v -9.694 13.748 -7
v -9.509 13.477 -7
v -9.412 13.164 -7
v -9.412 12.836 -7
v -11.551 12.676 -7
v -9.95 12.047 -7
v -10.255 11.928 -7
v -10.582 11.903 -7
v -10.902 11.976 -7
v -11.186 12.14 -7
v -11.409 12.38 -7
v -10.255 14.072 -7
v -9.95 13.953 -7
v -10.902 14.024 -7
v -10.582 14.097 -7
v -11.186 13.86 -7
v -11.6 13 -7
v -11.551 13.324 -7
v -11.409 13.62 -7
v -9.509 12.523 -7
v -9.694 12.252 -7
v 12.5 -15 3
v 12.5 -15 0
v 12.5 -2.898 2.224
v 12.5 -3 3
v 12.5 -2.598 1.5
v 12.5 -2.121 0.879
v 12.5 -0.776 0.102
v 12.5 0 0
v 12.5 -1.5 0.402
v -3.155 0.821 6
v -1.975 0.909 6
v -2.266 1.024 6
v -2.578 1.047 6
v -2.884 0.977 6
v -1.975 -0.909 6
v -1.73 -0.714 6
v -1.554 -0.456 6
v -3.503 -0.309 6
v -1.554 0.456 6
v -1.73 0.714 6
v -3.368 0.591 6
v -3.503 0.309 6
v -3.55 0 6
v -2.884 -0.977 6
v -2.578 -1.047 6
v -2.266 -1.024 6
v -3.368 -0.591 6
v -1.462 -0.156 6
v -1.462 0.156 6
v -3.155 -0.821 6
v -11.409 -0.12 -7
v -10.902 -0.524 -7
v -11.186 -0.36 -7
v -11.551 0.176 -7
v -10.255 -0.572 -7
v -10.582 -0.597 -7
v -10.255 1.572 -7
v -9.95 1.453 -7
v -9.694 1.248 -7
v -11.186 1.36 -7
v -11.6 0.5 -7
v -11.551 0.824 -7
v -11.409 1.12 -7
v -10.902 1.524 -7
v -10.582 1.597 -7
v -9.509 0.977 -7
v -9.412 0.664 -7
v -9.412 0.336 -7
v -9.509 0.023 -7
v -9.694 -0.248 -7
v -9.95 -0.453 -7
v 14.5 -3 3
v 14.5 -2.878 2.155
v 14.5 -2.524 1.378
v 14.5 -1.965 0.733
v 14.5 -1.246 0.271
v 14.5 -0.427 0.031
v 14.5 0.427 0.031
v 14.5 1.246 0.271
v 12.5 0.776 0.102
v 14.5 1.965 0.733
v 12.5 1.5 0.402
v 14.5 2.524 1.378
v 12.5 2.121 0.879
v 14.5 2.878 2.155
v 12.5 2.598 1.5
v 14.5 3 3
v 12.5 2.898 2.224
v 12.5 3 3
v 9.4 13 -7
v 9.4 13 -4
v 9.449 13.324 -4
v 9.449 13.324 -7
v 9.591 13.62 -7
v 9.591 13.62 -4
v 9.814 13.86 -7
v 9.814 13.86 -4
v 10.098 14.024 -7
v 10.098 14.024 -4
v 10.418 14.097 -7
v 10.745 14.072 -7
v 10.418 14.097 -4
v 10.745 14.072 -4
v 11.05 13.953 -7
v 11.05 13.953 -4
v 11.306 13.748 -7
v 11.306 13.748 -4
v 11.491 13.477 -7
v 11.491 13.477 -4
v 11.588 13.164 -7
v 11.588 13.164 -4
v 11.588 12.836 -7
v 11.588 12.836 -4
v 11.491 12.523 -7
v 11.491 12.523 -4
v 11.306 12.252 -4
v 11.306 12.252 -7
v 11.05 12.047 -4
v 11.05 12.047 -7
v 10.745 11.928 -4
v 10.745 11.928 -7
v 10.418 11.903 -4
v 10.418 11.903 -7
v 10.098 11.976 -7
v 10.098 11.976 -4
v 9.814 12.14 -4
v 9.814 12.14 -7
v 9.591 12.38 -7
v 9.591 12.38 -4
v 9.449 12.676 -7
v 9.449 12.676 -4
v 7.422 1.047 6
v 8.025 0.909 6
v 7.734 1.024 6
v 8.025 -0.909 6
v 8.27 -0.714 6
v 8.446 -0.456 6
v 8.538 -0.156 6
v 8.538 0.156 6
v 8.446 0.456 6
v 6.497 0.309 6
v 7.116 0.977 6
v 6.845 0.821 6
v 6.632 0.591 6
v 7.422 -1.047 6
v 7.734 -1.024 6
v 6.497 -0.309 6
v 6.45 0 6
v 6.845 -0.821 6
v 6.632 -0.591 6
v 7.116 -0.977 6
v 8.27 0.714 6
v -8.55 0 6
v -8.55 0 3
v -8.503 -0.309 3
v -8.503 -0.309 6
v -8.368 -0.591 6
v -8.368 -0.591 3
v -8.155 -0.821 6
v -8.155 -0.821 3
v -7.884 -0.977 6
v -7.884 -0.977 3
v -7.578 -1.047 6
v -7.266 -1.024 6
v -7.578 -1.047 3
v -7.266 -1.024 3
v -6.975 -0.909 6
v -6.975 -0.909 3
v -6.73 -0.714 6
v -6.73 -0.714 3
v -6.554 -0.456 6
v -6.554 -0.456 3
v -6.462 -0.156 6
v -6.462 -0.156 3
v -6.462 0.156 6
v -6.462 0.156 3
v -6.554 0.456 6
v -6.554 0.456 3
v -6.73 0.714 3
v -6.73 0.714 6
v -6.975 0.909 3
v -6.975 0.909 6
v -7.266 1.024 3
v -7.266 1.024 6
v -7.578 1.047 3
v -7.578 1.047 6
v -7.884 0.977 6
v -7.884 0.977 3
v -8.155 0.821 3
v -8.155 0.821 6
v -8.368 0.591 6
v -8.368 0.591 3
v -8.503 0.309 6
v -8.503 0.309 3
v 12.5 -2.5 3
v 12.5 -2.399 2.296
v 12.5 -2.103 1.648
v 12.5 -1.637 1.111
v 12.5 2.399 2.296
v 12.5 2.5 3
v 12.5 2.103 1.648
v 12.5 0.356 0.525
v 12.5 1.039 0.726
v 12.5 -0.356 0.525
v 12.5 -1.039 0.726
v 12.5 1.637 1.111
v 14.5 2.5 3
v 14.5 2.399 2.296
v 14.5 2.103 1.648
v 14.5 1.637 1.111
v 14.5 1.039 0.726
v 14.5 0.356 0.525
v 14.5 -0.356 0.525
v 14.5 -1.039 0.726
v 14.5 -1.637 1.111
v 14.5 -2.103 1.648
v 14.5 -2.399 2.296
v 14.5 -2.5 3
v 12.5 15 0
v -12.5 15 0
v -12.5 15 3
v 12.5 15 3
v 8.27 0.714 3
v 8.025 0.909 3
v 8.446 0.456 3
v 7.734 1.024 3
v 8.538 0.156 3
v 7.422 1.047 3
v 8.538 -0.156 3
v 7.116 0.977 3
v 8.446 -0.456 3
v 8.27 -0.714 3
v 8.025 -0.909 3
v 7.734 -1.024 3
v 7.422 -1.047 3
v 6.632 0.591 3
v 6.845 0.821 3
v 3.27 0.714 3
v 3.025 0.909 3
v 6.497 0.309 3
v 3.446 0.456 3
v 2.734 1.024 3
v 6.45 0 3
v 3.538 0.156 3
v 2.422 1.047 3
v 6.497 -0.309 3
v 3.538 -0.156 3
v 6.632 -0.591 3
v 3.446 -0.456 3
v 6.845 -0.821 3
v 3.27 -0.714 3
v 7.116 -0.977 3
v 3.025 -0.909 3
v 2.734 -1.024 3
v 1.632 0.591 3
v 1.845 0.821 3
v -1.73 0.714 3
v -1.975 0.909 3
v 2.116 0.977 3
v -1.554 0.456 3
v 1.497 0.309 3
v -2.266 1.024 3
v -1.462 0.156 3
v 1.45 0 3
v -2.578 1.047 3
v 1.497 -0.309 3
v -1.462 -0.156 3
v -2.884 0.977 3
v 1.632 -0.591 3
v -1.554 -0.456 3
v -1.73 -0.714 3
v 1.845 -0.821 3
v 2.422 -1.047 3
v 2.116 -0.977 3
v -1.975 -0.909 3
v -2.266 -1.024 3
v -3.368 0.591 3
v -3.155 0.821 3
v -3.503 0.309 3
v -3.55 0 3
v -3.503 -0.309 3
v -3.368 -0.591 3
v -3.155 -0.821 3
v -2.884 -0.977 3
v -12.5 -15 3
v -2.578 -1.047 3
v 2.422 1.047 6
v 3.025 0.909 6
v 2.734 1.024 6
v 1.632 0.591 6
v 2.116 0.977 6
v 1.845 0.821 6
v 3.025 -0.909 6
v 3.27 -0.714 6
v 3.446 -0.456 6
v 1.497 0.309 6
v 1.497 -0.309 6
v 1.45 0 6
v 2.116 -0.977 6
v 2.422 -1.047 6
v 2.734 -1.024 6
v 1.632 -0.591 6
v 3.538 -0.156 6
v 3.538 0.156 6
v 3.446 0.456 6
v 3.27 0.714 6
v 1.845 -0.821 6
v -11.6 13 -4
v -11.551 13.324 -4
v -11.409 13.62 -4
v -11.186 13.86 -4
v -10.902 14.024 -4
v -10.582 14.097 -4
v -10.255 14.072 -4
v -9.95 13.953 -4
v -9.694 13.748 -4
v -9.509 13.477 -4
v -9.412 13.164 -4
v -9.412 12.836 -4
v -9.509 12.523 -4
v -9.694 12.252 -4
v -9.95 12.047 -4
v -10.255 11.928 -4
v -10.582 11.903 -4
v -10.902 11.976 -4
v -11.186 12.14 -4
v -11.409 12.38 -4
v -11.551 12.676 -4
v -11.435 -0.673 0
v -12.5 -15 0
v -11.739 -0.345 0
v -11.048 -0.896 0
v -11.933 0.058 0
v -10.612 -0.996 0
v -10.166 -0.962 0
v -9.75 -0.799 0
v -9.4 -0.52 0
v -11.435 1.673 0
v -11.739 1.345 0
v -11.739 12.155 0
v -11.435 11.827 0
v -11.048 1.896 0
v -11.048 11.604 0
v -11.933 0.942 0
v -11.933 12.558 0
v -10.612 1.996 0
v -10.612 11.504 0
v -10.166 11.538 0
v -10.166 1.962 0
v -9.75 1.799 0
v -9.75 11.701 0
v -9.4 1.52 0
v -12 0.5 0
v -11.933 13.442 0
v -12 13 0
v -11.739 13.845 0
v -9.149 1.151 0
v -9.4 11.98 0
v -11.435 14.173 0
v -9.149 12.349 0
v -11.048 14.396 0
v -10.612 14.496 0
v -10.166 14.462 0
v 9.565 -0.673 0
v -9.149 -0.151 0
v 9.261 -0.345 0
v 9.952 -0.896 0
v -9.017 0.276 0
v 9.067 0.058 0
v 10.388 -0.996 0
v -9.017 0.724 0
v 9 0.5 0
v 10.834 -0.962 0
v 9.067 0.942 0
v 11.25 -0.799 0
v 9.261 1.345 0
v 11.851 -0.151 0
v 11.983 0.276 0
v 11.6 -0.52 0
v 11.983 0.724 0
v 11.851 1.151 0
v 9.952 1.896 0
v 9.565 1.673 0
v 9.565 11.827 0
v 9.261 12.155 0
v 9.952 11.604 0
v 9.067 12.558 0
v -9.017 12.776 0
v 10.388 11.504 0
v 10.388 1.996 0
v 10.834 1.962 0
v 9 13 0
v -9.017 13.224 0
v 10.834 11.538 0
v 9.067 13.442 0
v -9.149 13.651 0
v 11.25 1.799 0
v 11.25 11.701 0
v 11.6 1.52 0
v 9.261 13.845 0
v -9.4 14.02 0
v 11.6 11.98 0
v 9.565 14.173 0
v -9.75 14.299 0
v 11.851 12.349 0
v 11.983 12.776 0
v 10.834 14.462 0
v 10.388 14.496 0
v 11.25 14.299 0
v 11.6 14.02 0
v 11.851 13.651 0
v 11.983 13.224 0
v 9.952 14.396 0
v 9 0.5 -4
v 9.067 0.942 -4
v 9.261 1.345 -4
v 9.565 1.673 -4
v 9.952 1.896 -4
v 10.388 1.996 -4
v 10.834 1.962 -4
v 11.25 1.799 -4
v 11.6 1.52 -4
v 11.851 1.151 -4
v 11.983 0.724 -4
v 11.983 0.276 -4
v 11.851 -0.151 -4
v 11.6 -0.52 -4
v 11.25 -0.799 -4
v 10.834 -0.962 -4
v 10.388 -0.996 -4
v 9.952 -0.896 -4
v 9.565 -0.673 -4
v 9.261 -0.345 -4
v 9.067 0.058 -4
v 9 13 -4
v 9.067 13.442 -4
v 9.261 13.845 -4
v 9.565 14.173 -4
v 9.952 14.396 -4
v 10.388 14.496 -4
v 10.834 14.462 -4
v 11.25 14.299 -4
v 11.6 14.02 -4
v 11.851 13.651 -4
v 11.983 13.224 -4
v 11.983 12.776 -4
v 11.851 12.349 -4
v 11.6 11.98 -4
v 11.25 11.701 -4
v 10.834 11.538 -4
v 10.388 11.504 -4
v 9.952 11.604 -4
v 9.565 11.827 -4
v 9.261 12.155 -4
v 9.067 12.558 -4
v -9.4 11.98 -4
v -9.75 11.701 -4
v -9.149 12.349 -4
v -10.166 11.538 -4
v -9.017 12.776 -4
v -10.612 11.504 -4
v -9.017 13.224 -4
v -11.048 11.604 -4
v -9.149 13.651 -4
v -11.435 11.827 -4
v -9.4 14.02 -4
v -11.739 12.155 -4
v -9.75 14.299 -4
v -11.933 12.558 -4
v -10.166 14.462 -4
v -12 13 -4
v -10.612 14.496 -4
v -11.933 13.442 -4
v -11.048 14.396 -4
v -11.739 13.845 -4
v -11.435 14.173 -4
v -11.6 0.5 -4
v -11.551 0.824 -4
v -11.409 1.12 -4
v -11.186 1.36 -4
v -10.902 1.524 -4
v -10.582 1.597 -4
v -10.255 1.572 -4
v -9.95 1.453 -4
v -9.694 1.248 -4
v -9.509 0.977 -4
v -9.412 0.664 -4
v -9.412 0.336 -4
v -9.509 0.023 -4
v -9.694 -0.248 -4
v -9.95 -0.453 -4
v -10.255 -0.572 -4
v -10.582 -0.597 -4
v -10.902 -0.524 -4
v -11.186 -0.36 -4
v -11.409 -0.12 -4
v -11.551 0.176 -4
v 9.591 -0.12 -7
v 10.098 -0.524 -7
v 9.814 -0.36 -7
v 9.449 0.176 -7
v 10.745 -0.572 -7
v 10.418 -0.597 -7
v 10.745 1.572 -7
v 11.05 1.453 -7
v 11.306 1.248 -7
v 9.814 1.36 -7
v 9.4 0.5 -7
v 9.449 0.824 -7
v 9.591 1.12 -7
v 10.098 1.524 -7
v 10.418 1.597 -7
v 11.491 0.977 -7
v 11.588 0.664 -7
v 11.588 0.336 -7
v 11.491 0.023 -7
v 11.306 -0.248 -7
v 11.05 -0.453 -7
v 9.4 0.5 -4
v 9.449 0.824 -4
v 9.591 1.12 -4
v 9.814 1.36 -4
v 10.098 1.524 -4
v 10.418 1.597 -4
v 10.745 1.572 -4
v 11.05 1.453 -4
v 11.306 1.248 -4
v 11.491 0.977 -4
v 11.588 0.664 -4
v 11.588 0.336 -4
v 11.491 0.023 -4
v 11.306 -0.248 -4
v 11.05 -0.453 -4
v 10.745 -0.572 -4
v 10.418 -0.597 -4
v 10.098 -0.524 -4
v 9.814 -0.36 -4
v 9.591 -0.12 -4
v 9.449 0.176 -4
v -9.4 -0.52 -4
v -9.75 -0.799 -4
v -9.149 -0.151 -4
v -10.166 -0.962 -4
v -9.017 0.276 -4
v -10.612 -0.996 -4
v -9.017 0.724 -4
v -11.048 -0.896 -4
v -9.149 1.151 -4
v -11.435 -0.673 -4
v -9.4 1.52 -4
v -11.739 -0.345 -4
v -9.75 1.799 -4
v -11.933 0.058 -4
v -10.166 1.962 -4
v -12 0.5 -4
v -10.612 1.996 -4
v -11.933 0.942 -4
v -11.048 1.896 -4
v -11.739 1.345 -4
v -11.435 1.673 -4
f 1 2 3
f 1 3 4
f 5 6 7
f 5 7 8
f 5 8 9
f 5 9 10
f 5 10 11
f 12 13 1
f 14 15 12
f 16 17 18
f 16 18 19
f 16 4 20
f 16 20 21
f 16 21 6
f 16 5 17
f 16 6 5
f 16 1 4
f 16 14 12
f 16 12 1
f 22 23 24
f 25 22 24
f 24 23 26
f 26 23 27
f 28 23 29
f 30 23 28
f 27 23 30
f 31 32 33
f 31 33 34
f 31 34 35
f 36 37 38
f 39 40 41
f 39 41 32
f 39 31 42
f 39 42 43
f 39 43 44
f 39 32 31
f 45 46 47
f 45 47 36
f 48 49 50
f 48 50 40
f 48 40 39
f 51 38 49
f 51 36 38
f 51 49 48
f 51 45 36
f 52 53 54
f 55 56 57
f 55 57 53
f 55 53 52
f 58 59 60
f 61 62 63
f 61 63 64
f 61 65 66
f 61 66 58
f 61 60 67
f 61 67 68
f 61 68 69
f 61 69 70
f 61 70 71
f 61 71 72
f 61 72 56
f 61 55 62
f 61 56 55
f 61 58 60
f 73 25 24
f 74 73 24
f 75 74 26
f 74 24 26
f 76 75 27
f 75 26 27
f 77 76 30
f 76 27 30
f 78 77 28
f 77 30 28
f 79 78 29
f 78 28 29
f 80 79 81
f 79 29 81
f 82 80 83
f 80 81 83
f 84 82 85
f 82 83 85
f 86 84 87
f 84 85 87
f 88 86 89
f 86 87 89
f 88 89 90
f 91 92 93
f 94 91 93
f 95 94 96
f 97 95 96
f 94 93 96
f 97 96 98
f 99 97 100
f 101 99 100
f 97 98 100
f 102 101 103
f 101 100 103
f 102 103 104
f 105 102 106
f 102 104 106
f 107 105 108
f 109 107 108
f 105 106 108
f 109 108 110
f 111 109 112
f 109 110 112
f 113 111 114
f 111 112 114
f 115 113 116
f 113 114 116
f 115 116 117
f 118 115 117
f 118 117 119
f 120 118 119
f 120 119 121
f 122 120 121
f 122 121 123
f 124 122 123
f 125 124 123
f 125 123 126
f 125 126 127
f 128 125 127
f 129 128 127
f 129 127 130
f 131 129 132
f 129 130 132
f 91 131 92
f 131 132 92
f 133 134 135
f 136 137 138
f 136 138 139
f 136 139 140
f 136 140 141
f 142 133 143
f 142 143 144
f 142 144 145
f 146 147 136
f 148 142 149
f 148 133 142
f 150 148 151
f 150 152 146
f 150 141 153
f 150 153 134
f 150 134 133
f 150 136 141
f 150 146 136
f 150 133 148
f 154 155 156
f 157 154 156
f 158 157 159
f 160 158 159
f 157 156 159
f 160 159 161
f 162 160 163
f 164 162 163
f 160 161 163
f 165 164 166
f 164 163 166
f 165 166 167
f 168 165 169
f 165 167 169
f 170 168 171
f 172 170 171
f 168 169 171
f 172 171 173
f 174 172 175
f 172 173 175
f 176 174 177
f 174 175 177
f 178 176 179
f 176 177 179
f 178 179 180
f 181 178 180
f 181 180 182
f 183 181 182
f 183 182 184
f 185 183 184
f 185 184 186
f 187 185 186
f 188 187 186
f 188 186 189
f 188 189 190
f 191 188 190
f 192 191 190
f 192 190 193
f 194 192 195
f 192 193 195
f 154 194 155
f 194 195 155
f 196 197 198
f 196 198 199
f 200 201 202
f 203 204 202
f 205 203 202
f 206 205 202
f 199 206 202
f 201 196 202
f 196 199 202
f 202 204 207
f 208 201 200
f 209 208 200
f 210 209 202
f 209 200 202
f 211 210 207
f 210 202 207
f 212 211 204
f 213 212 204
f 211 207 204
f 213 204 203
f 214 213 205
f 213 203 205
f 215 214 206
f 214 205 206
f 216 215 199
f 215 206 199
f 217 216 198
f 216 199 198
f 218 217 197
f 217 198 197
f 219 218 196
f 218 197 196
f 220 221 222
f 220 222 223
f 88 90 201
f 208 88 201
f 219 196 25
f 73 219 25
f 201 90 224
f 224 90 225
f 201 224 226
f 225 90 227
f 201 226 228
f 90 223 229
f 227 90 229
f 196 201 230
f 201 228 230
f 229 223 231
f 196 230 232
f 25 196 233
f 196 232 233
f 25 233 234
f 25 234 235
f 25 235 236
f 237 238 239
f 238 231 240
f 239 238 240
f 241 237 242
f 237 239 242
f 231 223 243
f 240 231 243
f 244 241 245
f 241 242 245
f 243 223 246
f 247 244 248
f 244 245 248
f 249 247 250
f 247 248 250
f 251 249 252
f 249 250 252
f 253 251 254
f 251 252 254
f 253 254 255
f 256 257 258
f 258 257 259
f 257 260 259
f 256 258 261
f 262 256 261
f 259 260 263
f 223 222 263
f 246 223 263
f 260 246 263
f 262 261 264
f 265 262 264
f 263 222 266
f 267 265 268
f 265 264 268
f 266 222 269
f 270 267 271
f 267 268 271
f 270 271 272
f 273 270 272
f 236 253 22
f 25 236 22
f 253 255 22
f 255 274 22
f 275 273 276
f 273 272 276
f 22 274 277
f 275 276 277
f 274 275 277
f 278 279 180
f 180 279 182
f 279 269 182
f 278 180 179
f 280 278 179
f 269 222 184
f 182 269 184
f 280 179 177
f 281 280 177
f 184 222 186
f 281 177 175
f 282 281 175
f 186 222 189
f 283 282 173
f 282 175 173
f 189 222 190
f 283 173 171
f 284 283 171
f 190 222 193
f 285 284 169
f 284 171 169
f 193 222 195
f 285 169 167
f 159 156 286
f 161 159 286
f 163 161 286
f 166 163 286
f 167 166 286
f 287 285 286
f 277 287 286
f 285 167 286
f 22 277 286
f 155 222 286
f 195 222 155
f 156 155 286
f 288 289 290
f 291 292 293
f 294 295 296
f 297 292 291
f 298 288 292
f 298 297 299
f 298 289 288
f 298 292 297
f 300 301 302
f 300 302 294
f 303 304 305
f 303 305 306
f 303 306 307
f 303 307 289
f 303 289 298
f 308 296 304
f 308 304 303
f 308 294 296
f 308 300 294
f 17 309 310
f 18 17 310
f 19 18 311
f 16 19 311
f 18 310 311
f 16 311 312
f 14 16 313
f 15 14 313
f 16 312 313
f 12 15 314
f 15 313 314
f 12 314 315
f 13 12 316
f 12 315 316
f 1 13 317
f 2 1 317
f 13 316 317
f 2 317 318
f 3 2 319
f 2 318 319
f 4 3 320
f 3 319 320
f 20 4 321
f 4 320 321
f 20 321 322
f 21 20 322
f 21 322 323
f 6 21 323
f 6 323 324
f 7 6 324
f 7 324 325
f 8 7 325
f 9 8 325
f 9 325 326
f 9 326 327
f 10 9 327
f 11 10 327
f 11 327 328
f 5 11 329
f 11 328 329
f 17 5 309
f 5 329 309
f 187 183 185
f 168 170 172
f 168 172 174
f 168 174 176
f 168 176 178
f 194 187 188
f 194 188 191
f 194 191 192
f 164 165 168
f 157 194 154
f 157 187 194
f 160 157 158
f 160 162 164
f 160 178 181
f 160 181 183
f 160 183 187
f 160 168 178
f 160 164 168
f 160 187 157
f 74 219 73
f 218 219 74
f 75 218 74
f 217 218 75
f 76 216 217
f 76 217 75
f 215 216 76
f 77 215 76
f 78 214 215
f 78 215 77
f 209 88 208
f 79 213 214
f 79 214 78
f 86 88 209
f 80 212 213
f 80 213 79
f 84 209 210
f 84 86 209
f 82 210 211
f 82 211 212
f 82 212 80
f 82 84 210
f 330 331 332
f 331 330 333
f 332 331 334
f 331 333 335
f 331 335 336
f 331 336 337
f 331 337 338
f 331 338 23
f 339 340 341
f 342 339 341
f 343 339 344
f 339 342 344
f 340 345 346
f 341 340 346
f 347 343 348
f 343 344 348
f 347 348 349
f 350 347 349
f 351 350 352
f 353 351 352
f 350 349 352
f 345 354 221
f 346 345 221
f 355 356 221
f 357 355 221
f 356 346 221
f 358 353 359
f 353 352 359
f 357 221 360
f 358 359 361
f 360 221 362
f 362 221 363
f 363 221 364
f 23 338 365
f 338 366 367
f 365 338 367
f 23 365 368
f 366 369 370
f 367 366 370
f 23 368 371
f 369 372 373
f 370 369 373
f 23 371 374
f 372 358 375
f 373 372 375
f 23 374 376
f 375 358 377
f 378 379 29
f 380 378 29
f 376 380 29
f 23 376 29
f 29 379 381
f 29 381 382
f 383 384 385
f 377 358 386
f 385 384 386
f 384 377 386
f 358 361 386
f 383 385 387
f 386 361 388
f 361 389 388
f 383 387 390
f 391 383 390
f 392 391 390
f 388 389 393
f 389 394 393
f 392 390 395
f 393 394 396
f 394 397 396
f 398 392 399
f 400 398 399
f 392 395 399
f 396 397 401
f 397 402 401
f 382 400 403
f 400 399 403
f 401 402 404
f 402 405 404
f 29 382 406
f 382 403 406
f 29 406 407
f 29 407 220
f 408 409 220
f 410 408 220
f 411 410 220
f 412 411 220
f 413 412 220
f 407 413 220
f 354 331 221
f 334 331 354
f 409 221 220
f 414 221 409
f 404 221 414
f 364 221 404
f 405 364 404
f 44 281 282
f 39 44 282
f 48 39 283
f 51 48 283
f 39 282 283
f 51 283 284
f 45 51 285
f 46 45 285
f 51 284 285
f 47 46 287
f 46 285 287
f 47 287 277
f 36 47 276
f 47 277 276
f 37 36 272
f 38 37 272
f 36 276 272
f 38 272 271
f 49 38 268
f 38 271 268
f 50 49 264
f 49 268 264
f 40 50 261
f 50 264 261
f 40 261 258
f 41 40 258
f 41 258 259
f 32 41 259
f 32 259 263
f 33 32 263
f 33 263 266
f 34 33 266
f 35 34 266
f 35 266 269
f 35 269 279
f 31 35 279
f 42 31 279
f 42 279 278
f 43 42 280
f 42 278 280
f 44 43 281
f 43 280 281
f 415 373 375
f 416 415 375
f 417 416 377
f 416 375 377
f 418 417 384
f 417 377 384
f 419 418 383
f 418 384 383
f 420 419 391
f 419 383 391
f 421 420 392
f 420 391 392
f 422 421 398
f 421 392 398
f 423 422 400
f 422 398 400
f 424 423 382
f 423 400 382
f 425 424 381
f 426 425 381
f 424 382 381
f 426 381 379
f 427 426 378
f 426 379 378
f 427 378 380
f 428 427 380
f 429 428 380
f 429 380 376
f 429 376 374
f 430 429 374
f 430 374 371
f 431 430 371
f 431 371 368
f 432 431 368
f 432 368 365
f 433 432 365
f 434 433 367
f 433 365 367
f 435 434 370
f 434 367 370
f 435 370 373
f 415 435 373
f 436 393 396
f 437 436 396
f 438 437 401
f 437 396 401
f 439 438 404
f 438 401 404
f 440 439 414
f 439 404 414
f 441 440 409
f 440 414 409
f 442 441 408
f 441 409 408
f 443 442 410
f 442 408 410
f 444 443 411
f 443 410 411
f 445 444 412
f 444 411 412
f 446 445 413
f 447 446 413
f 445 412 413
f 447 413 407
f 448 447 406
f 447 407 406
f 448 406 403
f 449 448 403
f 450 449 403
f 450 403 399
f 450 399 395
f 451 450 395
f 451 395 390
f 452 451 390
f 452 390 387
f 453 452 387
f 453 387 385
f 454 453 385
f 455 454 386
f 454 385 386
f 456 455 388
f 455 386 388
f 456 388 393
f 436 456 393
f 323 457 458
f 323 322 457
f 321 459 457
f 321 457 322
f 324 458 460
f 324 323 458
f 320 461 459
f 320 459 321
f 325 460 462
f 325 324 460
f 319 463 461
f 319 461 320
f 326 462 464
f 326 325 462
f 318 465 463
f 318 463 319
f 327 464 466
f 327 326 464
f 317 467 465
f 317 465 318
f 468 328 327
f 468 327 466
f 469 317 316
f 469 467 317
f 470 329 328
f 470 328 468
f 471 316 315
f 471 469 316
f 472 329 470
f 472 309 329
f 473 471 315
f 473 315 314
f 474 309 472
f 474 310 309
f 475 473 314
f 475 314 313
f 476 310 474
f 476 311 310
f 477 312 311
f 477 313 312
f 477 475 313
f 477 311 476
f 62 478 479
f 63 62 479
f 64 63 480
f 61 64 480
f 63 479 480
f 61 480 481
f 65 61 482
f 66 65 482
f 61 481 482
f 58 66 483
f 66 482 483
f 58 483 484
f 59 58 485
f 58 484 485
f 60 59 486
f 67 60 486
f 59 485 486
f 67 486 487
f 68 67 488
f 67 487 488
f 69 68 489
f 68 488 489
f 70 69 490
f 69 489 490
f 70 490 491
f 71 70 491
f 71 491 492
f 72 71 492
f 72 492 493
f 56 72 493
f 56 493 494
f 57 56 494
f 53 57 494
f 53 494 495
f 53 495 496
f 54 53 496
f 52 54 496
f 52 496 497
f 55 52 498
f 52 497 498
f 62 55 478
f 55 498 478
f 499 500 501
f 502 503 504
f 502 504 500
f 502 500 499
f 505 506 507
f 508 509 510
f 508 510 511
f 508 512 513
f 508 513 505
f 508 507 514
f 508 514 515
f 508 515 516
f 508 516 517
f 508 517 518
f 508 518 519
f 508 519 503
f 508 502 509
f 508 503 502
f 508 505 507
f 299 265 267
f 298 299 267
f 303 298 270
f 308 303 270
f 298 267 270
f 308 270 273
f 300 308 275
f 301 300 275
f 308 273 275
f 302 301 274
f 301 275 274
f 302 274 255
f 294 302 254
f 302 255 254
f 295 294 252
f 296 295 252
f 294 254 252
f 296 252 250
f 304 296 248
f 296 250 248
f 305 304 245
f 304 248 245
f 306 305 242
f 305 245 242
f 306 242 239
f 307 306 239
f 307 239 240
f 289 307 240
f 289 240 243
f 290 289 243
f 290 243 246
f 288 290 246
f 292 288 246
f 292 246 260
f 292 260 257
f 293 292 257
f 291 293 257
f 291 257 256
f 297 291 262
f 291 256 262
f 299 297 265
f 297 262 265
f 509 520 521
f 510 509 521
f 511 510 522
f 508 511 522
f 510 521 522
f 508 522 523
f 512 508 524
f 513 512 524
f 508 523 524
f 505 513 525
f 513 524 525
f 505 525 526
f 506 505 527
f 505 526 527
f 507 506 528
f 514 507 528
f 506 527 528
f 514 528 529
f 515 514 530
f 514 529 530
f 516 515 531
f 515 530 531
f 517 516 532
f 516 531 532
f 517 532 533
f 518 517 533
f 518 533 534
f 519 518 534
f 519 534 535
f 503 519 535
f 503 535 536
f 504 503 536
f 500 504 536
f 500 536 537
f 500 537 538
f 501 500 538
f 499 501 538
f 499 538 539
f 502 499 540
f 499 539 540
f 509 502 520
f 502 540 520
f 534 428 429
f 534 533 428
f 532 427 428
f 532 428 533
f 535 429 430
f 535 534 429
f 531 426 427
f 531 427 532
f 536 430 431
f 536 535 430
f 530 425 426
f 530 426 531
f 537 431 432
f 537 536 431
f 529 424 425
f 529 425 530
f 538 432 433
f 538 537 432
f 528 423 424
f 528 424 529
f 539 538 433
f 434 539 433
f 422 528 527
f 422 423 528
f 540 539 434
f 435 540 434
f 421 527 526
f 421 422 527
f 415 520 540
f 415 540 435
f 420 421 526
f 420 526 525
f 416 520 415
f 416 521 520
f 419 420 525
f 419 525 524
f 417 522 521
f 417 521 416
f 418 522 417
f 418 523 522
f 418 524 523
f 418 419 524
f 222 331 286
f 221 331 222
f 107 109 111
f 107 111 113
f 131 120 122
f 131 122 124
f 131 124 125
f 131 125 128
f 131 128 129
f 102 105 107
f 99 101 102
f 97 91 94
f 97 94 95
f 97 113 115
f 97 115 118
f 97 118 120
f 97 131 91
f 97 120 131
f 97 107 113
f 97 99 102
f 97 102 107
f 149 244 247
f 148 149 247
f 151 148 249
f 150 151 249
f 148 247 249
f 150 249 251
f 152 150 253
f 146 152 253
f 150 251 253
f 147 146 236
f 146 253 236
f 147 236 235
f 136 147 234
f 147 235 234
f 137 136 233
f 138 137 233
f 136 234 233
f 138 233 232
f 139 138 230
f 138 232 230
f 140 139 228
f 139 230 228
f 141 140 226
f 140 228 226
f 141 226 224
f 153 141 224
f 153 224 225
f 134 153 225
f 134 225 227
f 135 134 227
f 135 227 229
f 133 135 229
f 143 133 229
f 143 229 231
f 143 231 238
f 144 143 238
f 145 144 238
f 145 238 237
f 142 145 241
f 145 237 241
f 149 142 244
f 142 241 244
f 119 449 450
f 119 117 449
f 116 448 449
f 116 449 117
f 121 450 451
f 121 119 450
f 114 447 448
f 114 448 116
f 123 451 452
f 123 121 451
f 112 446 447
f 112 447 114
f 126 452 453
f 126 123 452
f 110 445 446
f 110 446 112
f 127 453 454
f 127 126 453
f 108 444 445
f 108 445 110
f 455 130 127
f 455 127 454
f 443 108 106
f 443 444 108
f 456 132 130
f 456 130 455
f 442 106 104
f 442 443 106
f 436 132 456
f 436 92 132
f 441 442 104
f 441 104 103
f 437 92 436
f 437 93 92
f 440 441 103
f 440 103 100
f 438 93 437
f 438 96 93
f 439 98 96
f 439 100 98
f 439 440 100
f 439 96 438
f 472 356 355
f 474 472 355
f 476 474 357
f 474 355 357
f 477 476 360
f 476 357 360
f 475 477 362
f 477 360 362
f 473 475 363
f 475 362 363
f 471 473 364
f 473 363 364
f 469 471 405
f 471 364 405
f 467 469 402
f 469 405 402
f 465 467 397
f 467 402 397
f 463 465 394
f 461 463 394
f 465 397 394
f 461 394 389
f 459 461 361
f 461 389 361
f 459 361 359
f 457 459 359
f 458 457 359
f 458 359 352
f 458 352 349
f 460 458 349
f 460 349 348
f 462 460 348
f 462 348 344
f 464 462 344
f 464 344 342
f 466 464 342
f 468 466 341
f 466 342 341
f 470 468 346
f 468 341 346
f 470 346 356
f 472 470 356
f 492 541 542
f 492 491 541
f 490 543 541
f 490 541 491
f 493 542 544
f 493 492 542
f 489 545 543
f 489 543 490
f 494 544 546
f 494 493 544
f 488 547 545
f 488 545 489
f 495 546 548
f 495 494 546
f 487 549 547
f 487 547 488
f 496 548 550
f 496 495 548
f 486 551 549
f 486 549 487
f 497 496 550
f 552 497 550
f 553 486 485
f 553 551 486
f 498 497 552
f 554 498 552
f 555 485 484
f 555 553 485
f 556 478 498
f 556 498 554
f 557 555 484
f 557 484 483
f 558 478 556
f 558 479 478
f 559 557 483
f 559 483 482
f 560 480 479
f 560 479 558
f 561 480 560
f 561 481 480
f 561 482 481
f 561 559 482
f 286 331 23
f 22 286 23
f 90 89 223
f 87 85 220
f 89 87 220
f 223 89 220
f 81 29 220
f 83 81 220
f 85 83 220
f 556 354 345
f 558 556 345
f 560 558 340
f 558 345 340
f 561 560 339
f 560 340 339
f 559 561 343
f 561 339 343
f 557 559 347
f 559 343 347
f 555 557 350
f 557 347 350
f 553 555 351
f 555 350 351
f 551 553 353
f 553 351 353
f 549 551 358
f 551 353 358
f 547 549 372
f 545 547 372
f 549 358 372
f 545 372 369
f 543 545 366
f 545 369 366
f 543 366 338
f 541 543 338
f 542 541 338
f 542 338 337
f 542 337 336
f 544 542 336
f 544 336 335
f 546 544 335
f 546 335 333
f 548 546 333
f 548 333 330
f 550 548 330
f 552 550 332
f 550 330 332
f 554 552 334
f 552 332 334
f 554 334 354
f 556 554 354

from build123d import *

# Parameters (mm, degrees)
CROQUIS1_W              = 25
CROQUIS1_H              = 30
SALIENTE_EXTRUIR1_DEPTH = 3
CROQUIS2_R              = 1.05
SALIENTE_EXTRUIR2_DEPTH = 3
SALIENTE_EXTRUIR3_DEPTH = 2
CROQUIS4_R              = 1.5
SALIENTE_EXTRUIR4_DEPTH = 4
CROQUIS5_R              = 1.1
SALIENTE_EXTRUIR5_DEPTH = 3


with BuildPart() as part:
    # Croquis1 → Saliente-Extruir1 (new body)
    with BuildSketch(Plane.XY):
        Rectangle(CROQUIS1_W, CROQUIS1_H)
    extrude(amount=SALIENTE_EXTRUIR1_DEPTH)

    # Croquis2 → Saliente-Extruir2 (add)
    with BuildSketch(Plane.XY.offset(3)):
        with Locations(Location((-7.5, 0, 0), (0, 0, 180))):
            Circle(CROQUIS2_R)
        with Locations(Location((-2.5, 0, 0), (0, 0, 180))):
            Circle(CROQUIS2_R)
        with Locations(Location((2.5, 0, 0), (0, 0, 180))):
            Circle(CROQUIS2_R)
        with Locations(Location((7.5, 0, 0), (0, 0, 180))):
            Circle(CROQUIS2_R)
    extrude(amount=SALIENTE_EXTRUIR2_DEPTH)

    # Croquis3 → Saliente-Extruir3 (add)
    with BuildSketch(Plane(origin=(12.5, 0, 0), x_dir=(0, 0, -1), z_dir=(1, 0, 0))):
        with BuildLine():
            Line((-3, 3), (-3, 2.5))
            ThreePointArc((-3, 2.5), (-0.5, 0), (-3, -2.5))
            Line((-3, -2.5), (-3, -3))
            ThreePointArc((-3, -3), (0, 0), (-3, 3))
        make_face()
    extrude(amount=SALIENTE_EXTRUIR3_DEPTH)

    # Croquis4 → Saliente-Extruir4 (add)
    with BuildSketch(Plane(origin=(0, 0, 0), x_dir=(-1, 0, 0), z_dir=(0, 0, -1))):
        with Locations((10.5, 13)):
            Circle(CROQUIS4_R)
        with Locations((-10.5, 13)):
            Circle(CROQUIS4_R)
        with Locations((-10.5, 0.5)):
            Circle(CROQUIS4_R)
        with Locations((10.5, 0.5)):
            Circle(CROQUIS4_R)
    extrude(amount=SALIENTE_EXTRUIR4_DEPTH)

    # Croquis5 → Saliente-Extruir5 (add)
    with BuildSketch(Plane(origin=(0, 0, -4), x_dir=(-1, 0, 0), z_dir=(0, 0, -1))):
        with Locations((10.5, 13)):
            Circle(CROQUIS5_R)
        with Locations((-10.5, 13)):
            Circle(CROQUIS5_R)
        with Locations((-10.5, 0.5)):
            Circle(CROQUIS5_R)
        with Locations((10.5, 0.5)):
            Circle(CROQUIS5_R)
    extrude(amount=SALIENTE_EXTRUIR5_DEPTH)


solid = part.part
